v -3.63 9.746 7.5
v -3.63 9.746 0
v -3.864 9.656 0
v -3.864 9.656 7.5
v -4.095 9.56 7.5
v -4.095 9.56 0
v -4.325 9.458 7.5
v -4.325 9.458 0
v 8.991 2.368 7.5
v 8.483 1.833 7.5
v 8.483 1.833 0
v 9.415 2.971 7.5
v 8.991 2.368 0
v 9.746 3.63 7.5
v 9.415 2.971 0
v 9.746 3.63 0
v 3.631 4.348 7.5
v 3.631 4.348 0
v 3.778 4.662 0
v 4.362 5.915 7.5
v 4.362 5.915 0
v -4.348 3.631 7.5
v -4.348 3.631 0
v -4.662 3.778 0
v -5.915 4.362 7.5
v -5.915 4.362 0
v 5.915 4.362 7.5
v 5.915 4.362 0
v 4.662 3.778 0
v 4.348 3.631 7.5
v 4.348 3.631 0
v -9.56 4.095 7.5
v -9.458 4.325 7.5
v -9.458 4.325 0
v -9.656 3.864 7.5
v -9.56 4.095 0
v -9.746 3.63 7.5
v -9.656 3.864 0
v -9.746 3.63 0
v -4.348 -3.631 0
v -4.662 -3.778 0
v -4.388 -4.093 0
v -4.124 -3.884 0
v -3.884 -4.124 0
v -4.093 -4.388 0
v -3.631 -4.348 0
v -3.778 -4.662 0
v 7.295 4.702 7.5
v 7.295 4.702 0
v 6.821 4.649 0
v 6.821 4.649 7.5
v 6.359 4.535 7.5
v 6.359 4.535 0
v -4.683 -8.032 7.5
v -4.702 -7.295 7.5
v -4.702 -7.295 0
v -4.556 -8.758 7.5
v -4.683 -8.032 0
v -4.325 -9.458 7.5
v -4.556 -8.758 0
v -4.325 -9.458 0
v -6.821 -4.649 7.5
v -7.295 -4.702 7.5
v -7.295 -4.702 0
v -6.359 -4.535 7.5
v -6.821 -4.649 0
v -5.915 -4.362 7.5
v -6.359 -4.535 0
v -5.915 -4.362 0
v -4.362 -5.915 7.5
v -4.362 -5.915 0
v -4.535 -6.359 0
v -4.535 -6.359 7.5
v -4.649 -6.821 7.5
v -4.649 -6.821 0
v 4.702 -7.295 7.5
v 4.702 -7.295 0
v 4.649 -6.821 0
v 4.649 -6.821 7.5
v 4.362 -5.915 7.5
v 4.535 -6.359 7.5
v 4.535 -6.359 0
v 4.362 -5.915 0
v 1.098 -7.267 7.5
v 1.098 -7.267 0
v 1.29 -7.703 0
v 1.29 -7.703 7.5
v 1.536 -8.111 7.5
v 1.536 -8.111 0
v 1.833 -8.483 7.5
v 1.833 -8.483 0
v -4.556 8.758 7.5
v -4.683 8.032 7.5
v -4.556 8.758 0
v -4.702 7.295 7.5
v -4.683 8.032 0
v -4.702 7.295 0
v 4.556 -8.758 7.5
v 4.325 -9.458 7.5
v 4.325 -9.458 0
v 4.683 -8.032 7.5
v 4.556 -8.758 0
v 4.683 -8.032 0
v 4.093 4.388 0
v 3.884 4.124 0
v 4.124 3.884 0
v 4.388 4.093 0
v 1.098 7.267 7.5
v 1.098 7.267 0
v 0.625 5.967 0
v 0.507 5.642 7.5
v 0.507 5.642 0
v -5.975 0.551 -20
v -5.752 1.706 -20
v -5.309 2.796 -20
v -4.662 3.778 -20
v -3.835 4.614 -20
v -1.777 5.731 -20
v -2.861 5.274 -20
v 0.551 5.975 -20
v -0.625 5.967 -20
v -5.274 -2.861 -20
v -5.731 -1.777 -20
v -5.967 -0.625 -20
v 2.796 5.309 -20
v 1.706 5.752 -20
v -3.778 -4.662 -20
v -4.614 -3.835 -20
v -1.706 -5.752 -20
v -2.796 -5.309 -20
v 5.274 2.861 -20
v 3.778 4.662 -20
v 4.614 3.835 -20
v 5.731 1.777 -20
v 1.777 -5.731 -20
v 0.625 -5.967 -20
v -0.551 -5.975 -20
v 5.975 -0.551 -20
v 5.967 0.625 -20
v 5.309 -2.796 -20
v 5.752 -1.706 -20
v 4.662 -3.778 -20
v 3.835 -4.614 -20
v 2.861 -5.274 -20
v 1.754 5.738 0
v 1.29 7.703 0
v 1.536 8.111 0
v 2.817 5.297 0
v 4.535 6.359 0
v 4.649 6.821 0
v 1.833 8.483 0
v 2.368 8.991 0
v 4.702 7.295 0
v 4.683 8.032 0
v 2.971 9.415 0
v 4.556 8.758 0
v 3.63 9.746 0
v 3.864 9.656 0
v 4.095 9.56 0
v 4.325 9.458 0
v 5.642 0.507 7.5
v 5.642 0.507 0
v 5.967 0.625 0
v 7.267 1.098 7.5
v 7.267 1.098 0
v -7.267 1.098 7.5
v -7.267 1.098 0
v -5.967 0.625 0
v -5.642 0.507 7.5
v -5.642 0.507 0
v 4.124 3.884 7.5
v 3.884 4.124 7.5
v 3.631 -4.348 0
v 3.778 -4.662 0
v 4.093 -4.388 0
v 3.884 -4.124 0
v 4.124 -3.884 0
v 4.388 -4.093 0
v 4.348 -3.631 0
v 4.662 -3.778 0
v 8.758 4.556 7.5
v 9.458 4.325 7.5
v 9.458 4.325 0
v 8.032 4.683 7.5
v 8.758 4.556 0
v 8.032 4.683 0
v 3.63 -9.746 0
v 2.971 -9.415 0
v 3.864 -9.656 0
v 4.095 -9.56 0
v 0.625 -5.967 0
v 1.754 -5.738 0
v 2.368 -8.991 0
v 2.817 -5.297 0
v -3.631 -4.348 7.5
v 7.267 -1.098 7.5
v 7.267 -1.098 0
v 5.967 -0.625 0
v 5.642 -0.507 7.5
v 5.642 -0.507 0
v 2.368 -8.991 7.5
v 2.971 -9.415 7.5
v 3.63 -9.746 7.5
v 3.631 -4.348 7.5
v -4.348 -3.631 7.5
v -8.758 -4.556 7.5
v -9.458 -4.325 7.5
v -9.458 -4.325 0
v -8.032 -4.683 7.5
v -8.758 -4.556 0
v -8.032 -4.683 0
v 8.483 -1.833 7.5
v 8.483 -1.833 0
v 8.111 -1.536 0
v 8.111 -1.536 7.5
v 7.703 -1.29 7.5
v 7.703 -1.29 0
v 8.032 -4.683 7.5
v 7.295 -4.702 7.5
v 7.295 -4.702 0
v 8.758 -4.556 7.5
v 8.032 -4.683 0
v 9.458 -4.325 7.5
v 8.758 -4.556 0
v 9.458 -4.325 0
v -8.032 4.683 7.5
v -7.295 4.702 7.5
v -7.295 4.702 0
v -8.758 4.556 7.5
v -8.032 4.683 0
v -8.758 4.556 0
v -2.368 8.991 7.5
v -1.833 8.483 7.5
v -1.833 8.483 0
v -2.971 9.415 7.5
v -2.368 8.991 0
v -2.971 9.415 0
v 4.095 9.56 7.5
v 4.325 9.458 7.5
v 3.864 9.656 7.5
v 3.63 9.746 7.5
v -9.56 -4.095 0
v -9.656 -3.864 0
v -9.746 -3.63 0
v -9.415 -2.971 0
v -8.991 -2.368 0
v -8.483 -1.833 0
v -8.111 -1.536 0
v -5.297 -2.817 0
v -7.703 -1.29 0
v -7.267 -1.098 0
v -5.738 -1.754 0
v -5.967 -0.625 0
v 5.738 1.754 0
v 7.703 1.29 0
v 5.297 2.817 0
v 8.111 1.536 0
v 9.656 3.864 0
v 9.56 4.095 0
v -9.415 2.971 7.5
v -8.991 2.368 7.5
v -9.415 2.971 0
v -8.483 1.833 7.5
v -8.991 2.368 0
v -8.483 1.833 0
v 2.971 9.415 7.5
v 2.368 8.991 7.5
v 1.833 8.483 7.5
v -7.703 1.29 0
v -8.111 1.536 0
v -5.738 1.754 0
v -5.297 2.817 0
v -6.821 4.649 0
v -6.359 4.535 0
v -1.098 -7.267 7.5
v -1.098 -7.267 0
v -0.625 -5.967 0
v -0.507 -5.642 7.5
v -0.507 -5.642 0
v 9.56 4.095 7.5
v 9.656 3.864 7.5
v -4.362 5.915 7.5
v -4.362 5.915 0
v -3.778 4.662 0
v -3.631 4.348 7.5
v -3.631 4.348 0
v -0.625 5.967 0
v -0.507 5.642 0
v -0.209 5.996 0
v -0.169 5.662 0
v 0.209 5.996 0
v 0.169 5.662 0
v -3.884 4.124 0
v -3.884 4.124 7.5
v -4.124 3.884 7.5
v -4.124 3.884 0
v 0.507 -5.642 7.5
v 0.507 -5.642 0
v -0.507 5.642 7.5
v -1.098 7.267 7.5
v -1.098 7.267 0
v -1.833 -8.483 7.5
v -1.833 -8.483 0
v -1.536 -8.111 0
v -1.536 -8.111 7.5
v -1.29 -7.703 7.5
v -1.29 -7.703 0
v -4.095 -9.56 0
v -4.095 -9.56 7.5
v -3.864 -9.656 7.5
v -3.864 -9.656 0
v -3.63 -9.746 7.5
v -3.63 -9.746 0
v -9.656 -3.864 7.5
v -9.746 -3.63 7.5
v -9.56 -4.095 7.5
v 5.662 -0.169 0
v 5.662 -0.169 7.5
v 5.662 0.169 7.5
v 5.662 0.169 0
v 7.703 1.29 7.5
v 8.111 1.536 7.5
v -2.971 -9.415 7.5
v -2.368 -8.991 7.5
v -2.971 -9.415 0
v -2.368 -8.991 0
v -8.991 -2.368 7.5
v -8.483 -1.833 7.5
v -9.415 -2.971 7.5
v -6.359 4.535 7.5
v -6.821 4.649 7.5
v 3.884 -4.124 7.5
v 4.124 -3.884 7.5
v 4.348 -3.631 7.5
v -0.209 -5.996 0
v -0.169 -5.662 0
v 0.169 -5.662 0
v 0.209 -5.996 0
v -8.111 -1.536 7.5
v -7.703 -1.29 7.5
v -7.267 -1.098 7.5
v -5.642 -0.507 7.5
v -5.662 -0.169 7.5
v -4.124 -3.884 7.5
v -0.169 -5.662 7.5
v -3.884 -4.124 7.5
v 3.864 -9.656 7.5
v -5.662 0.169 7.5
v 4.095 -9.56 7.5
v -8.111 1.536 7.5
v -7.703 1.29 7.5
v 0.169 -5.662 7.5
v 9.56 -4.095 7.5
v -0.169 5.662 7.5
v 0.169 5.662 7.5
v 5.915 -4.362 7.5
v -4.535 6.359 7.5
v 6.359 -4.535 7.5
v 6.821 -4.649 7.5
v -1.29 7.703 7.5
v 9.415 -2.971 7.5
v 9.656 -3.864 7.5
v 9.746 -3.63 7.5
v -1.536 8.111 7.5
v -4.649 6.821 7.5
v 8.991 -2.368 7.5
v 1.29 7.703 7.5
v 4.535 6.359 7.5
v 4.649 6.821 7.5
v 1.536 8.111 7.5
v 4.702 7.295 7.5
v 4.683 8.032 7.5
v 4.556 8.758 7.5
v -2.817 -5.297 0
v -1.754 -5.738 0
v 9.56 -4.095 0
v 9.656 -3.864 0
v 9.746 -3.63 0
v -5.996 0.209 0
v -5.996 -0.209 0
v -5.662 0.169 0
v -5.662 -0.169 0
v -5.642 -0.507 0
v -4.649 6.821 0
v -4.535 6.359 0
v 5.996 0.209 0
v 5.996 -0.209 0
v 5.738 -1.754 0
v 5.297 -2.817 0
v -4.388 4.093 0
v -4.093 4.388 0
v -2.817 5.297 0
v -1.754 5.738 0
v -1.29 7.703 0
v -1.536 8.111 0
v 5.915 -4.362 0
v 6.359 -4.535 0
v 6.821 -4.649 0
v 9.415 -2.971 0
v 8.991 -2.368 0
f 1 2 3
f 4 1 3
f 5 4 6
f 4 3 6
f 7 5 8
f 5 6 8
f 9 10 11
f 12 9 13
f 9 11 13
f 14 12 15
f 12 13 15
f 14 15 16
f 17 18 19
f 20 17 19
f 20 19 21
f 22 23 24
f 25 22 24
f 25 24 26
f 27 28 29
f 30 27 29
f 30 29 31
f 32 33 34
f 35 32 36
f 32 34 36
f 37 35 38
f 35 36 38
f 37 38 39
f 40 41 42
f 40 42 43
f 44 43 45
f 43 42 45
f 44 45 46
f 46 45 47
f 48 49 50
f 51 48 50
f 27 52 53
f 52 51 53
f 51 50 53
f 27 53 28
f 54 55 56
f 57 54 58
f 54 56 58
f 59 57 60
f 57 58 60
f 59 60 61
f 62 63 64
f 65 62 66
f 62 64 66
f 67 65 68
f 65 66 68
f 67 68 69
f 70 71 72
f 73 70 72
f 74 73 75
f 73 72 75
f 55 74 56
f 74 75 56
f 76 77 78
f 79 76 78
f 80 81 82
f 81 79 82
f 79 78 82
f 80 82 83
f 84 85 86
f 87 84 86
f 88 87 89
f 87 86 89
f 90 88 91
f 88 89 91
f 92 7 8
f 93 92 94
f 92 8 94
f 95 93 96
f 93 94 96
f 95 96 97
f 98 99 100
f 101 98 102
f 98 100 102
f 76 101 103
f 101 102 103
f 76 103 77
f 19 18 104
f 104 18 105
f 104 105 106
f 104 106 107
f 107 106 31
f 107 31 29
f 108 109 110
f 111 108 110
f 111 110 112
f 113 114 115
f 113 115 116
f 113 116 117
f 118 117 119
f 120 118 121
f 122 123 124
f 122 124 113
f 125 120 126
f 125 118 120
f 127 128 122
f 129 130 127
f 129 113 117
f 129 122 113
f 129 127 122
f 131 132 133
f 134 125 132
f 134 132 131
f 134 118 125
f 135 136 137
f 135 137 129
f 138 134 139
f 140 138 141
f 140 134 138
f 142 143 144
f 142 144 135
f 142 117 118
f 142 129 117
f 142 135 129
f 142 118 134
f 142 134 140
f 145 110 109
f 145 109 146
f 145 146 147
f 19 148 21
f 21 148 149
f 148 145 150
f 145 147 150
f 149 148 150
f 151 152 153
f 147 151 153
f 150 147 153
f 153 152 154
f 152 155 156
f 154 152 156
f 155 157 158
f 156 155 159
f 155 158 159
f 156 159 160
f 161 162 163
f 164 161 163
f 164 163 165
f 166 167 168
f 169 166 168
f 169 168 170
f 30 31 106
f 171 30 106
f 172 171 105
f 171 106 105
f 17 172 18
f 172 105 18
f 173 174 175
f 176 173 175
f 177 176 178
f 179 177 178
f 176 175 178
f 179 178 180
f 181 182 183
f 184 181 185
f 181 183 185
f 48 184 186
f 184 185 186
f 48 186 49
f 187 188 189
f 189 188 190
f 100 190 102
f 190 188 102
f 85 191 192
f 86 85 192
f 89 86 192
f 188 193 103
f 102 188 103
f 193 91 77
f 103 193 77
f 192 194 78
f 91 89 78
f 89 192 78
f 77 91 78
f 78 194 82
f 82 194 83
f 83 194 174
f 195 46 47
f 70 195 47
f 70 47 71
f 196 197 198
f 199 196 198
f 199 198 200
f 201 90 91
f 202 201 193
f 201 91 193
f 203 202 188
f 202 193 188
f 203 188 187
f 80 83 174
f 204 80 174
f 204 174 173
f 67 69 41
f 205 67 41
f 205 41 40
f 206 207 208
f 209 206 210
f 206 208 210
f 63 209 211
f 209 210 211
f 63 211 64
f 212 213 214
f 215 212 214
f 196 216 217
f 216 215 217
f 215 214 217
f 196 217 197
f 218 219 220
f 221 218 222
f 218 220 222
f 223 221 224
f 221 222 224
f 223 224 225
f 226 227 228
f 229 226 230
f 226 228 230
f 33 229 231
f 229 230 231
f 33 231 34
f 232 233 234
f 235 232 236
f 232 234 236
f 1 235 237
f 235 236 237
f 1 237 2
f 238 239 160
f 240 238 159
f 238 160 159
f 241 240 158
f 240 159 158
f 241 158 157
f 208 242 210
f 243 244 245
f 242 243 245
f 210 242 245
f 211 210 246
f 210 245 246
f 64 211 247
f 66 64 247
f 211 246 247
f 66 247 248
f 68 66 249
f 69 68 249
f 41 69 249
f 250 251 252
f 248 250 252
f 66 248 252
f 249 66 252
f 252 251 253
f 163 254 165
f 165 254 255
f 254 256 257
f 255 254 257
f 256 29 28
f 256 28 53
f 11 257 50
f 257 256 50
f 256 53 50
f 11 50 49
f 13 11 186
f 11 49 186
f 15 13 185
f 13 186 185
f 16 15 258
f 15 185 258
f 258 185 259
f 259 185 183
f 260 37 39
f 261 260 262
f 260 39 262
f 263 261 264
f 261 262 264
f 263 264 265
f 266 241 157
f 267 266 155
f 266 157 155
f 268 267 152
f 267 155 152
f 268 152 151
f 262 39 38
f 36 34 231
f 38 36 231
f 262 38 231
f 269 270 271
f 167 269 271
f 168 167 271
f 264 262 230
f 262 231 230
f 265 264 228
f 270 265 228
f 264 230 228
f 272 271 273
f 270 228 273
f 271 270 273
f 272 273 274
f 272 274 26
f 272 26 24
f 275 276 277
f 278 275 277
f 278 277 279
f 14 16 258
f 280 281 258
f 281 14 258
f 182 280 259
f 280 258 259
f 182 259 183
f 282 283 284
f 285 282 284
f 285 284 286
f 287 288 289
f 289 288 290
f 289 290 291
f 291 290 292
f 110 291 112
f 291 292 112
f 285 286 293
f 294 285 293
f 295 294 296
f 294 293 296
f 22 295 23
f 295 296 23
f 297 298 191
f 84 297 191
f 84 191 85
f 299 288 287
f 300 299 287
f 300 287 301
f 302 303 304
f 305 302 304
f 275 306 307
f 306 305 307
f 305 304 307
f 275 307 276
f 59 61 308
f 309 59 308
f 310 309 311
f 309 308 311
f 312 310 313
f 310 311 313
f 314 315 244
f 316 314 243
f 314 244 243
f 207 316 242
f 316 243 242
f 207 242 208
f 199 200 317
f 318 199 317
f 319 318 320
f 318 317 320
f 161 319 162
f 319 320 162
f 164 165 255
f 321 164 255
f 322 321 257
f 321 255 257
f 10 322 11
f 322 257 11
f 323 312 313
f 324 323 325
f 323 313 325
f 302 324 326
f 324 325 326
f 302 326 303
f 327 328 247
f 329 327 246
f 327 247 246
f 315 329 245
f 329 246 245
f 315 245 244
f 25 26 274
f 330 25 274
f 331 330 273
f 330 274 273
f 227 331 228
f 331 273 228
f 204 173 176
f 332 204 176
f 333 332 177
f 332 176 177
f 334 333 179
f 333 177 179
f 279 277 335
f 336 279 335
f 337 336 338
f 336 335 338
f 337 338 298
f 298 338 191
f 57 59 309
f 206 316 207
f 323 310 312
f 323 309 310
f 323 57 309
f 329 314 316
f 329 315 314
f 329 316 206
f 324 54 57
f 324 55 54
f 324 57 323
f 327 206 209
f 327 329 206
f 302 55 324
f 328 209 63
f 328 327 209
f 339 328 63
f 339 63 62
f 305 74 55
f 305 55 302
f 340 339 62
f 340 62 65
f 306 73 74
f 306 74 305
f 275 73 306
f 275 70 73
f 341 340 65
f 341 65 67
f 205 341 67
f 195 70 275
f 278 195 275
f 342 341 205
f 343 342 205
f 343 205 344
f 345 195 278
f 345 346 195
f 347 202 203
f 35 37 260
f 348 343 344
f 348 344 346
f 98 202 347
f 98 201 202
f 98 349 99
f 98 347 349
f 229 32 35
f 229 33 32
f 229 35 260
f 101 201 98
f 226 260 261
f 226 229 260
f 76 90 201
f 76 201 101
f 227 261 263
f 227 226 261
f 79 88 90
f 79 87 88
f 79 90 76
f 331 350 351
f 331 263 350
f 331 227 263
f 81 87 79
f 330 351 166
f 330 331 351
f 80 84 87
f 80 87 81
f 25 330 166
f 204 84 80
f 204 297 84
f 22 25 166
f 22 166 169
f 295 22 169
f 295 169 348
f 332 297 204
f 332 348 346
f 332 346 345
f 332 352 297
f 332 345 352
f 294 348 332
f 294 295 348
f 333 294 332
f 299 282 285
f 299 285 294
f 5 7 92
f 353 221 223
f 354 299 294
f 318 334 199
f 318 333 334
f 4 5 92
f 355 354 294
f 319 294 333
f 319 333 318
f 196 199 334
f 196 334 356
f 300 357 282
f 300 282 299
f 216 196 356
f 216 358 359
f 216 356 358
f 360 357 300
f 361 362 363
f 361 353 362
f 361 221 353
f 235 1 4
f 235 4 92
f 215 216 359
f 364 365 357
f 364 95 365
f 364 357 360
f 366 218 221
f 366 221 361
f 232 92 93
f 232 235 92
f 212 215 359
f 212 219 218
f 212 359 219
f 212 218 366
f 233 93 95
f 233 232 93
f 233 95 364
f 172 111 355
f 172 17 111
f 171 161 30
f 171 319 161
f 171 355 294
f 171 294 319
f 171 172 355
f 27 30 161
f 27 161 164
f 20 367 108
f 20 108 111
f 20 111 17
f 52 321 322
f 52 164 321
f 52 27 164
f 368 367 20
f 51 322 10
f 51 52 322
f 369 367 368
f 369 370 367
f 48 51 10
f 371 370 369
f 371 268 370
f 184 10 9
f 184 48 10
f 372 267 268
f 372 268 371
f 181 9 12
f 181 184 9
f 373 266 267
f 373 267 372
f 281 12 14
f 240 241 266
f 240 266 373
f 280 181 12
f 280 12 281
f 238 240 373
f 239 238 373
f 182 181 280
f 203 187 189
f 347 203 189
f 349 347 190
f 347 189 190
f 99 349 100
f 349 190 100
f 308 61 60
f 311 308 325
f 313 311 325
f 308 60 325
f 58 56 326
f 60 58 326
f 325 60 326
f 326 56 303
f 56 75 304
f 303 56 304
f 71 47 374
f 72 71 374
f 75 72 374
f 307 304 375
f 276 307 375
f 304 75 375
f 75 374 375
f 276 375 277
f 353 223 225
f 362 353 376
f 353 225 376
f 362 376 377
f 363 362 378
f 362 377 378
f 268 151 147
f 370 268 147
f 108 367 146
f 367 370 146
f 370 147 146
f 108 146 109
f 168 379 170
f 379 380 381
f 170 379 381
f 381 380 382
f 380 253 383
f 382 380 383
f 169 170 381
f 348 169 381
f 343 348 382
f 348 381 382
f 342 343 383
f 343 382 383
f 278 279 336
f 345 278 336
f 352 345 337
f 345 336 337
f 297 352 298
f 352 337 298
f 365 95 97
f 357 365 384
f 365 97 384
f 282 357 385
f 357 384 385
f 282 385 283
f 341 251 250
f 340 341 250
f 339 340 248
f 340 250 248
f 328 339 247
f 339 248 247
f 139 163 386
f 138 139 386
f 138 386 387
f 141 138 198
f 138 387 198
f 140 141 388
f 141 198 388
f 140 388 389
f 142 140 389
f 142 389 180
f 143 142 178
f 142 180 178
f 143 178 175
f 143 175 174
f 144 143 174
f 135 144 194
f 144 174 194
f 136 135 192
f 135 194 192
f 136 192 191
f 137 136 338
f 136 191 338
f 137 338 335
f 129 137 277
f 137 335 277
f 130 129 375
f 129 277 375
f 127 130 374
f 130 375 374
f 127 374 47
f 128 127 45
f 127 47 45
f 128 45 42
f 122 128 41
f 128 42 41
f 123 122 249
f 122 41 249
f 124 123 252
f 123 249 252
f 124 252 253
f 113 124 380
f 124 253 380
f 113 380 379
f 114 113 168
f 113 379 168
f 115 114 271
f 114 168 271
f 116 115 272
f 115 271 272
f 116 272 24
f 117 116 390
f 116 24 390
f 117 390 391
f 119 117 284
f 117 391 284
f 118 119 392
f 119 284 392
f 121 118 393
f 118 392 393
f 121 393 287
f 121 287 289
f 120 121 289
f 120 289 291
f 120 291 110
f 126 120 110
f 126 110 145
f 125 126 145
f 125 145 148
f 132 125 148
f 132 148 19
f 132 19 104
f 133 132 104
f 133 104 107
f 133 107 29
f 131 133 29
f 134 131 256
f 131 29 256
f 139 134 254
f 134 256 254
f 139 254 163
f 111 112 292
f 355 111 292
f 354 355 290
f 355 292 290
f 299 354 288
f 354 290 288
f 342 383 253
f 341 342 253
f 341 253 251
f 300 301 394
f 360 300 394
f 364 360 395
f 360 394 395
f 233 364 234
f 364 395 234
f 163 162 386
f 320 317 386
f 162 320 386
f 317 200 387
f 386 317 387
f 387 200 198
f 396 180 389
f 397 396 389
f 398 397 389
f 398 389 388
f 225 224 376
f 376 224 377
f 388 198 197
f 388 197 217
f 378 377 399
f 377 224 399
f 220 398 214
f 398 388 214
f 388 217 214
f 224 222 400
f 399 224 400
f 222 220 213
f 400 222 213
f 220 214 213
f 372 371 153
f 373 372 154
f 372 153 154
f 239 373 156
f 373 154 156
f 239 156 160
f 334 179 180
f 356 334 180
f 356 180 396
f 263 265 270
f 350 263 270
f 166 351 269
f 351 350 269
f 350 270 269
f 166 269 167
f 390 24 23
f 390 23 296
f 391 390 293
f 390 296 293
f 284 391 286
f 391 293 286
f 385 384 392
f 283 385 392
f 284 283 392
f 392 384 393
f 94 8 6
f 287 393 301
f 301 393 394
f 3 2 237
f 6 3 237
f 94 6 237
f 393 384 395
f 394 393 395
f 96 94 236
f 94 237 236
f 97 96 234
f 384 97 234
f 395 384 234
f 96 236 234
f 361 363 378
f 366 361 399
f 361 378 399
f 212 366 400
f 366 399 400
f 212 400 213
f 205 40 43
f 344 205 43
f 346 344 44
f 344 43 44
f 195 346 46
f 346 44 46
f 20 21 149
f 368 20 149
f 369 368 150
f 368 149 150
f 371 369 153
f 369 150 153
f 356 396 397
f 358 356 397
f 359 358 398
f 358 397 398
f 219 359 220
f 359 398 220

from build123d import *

# Parameters (mm, degrees)
ESBO_O2_R                = 10.4
RESSALTO_EXTRUS_O1_DEPTH = 7.5
CORTE_EXTRUS_O1_DEPTH    = 17.509694122
PADR_OCIRCULAR2_COUNT    = 8
ESBO_O3_R                = 6
RESSALTO_EXTRUS_O2_DEPTH = 20


with BuildPart() as part:
    # Esboço2 → Ressalto-extrusão1 (new body)
    with BuildSketch(Plane.XY):
        Circle(ESBO_O2_R)
    extrude(amount=RESSALTO_EXTRUS_O1_DEPTH)

    # Esboço1 → Corte-extrusão1 (cut, through all)
    with BuildSketch(Plane.XY):
        with BuildLine():
            Line((-0.506751832, 5.642289215), (-1.097919721, 7.266509641))
            ThreePointArc((-1.097919721, 7.266509641), (-1.406126414, 7.910707201), (-1.832951119, 8.483247621))
            ThreePointArc((-1.832951119, 8.483247621), (-2.661618953, 9.214061597), (-3.630088541, 9.745894376))
            ThreePointArc((-3.630088541, 9.745894376), (0, 10.4), (3.630088541, 9.745894376))
            ThreePointArc((3.630088541, 9.745894376), (2.661618953, 9.214061597), (1.832951119, 8.483247621))
            ThreePointArc((1.832951119, 8.483247621), (1.406126414, 7.910707201), (1.097919721, 7.266509641))
            Line((1.097919721, 7.266509641), (0.506751832, 5.642289215))
            ThreePointArc((0.506751832, 5.642289215), (0, 5.665), (-0.506751832, 5.642289215))
        make_face()
    corte_extrus_o1 = extrude(amount=CORTE_EXTRUS_O1_DEPTH, mode=Mode.SUBTRACT)

    # PadrãoCircular2: Corte-extrusão1 ×8 about axis
    padr_ocircular2_axis = Axis((0, 0, 0), (0, 0, 1))
    for i in range(1, PADR_OCIRCULAR2_COUNT):
        add(corte_extrus_o1.rotate(padr_ocircular2_axis, i * 360 / PADR_OCIRCULAR2_COUNT), mode=Mode.SUBTRACT)

    # Esboço3 → Ressalto-extrusão2 (add)
    with BuildSketch(Plane(origin=(0, 0, 0), x_dir=(-1, 0, 0), z_dir=(0, 0, -1))):
        with Locations(Location((0, 0, 0), (0, 0, 174.020217927))):
            Circle(ESBO_O3_R)
    extrude(amount=RESSALTO_EXTRUS_O2_DEPTH)


solid = part.part
